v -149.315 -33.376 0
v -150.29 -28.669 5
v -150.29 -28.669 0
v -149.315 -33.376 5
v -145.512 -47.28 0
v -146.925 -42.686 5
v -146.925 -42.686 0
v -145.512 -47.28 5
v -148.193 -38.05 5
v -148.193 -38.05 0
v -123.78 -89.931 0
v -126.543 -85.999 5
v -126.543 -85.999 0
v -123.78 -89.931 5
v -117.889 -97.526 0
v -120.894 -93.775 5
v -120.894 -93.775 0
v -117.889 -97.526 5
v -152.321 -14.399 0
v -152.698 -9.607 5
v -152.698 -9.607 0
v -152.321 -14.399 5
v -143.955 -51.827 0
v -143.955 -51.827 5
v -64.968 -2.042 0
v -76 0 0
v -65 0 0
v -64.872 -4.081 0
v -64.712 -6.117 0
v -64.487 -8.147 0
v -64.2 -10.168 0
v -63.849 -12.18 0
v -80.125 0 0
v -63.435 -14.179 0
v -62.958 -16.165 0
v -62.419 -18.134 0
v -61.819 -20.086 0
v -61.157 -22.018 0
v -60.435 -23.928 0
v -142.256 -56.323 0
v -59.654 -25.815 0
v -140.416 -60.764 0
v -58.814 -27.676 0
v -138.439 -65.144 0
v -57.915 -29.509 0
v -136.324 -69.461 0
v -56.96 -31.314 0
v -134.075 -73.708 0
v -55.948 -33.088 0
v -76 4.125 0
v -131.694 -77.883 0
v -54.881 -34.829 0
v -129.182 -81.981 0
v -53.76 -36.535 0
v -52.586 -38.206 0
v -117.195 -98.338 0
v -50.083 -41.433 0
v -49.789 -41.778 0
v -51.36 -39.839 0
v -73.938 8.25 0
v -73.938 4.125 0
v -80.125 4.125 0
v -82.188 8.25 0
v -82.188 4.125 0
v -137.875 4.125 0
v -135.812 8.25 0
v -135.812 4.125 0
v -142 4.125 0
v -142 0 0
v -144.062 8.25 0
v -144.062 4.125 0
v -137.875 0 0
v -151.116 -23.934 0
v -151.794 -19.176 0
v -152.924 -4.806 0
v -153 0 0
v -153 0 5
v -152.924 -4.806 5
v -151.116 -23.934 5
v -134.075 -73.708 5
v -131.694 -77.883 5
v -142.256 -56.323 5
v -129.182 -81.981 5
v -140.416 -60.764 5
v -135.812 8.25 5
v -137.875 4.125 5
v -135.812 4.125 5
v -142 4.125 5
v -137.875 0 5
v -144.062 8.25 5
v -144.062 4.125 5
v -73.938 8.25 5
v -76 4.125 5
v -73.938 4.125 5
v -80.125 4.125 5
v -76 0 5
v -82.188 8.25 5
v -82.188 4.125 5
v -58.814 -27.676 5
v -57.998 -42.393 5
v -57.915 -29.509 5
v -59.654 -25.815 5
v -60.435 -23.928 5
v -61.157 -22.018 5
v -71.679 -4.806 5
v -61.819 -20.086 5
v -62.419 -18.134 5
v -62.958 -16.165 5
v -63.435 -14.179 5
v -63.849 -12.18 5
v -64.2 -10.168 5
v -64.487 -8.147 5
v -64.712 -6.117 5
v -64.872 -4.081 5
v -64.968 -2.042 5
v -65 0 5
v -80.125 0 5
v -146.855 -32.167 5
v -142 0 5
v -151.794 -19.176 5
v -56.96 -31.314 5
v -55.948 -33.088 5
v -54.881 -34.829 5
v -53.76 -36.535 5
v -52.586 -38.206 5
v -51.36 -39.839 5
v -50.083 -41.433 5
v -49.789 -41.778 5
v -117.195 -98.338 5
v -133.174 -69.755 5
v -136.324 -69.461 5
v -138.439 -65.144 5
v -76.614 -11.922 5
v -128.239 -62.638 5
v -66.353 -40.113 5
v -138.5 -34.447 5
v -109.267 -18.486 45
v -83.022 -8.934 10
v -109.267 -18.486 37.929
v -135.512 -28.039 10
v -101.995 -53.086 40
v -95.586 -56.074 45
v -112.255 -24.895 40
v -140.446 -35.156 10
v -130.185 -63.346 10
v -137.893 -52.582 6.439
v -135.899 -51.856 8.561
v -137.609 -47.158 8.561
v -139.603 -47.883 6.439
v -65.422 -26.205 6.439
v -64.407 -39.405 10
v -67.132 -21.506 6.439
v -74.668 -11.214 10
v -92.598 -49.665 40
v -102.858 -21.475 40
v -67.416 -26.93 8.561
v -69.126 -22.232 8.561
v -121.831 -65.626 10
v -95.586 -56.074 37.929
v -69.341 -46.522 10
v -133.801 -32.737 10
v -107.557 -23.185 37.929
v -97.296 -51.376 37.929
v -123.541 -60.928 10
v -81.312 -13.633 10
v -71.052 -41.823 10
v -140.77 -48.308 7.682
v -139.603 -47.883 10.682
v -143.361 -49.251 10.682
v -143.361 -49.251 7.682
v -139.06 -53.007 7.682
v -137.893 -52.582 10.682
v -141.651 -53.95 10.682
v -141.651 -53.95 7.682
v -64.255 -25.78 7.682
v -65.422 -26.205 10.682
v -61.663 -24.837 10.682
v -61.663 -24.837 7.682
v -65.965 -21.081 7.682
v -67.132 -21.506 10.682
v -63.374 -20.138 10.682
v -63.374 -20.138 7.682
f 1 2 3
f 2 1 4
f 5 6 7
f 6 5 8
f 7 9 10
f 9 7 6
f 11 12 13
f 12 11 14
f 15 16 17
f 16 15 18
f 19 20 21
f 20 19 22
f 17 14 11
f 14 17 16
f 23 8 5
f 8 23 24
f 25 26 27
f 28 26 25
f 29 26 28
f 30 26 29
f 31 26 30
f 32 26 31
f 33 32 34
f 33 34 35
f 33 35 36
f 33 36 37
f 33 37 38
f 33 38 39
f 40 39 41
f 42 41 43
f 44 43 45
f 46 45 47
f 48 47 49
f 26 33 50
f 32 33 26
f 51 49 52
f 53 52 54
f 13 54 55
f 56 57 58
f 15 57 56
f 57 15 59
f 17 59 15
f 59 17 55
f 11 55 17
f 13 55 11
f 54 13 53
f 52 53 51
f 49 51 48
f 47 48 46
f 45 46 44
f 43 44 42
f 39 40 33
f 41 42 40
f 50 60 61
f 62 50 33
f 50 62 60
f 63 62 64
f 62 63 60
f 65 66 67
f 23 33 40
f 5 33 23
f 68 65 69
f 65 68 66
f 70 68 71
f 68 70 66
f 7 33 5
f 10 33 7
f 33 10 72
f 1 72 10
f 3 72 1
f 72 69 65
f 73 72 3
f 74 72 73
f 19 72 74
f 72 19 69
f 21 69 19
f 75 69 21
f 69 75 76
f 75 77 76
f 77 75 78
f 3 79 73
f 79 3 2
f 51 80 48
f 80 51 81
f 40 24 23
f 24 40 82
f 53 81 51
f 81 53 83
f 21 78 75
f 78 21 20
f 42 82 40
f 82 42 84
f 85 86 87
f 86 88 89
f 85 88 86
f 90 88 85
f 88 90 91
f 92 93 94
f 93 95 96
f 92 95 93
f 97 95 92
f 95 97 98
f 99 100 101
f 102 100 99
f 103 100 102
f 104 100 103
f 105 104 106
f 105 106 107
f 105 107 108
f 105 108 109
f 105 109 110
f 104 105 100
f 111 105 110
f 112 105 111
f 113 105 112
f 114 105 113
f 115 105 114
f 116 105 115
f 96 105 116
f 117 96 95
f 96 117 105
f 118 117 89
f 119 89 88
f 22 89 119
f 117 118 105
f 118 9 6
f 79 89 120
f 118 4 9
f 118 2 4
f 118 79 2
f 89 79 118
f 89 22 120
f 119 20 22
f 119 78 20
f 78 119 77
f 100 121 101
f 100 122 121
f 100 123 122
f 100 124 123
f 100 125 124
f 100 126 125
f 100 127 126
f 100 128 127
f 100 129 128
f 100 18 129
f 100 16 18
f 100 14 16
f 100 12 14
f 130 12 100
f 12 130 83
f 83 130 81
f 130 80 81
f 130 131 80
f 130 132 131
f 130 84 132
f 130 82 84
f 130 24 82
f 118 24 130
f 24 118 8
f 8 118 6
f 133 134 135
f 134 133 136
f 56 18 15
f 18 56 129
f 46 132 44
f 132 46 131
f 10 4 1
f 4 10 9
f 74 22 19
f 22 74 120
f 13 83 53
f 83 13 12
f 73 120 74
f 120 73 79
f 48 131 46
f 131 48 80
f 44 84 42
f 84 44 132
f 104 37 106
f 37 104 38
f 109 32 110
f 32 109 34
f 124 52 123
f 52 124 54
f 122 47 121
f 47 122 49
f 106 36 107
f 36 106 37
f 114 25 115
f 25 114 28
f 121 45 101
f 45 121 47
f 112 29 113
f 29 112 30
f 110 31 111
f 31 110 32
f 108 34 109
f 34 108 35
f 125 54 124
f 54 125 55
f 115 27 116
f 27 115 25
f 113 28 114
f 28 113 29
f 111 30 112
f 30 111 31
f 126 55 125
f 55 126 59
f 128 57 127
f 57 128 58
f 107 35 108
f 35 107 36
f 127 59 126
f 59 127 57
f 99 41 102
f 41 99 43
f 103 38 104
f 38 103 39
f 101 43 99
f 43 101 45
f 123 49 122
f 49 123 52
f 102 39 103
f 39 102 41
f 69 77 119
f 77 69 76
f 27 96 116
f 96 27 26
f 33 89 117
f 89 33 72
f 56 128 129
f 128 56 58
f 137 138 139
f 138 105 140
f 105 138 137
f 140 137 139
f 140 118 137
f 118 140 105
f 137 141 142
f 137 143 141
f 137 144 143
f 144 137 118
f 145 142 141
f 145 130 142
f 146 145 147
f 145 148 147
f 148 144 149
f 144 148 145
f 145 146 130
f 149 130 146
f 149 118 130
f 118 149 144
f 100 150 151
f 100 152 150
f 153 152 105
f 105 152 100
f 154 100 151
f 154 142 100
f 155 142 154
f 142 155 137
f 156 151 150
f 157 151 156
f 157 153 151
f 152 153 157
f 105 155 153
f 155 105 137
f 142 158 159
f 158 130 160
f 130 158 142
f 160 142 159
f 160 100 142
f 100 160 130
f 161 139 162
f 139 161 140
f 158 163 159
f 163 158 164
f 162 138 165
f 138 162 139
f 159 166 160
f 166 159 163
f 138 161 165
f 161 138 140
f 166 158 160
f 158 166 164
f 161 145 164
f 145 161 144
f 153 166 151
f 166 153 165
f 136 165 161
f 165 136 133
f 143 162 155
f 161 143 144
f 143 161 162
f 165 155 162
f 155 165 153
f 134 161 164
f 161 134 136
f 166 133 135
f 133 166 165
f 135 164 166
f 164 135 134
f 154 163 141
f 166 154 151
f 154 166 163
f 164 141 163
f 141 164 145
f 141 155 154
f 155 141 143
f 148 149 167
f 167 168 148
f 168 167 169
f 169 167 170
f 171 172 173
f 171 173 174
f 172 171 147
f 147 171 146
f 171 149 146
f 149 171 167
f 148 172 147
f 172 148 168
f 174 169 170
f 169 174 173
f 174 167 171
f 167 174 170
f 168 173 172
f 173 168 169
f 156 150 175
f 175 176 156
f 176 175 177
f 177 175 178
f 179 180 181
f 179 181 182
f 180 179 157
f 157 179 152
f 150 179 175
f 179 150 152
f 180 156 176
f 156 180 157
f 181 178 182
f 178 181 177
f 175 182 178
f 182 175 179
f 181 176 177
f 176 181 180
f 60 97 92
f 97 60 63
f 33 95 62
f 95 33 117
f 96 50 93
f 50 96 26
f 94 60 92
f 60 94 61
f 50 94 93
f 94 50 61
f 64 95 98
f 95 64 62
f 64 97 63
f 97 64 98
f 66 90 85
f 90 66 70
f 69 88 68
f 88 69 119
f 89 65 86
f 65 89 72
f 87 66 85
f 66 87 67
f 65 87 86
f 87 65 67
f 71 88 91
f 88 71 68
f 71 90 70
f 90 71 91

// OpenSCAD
// file: camera_mount.scad
triangle_height = 40;
triangle_width = 40;
side_length = sqrt(2) * triangle_height;
beam_width = 5;
smaller_side_length = side_length - beam_width* (1 + sqrt(2))*sqrt(2);

module triangle(side, z){
    difference() {
        translate([0, 0, -side/sqrt(2)])
        rotate([45, 0, 0])
        cube([z, side, side]);
        
        // Cut off bottom
        translate([-500, -500, -1000])
        cube([1000, 1000, 1000]);
    };
};

module truss(){
    difference(){
        triangle(side_length, triangle_width);
        // hollow out triangle cross section
        translate([-0.5, 0, beam_width])

        triangle(smaller_side_length, triangle_width + 1);
        
        translate([beam_width, -500, , beam_width])
        cube([triangle_width - beam_width*2, 1000, triangle_height- beam_width*(2)]);
        
        //hollow base
        translate([beam_width, 0, -(beam_width*(sqrt(2)))])
        triangle(side_length, triangle_width - 2*beam_width);
    }
};

module notch(){
    translate([-500, -beam_width/4, 0])
    cube([1000, beam_width/2, beam_width/2]);
};

module hook(){
    translate([-beam_width/2,-1.5,0]) union()
    {
    cube([beam_width,3,3]);
    translate([0,0,3]) rotate([-45,0,0]) cube([beam_width,3,4]);
    }
}

//hook();
truss();
translate([0,beam_width / 2,beam_width / 2]) translate([smaller_side_length / 2, -triangle_width, 0]) rotate([45,0,0]) rotate(180) hook();
translate([0,-beam_width / 2,beam_width / 2]) translate([smaller_side_length / 2, triangle_width, 0]) rotate([-45,0,]) hook();
//difference(){
//    truss();
//    notch();
//};
// main file
ri = 65; // 65mm radius of turntable
ro = ri + 40*2.2; // outer radius
h = 5;

// r1 = outer radius, r2 = inner radius
module platform_half(r1, r2)
{
    difference()
    {
    difference()
    {
        cylinder(r=r1, h=h, $fn=200);
        translate([0,0,-0.05*h]) cylinder(r=r2, h=1.1*h, $fn=200);
    }
    translate([-ro,0,-2*h]) cube(2*ro);
}
}

// r1 = outer radius, r2 = inner radius
module platform(r1, r2) {
    difference()
    {
        platform_half(r1, r2);
        union()
        {
            rotate(40) platform_half(1.1*r1, 0.9*r2);
        }
    }
}

module mount()
{
    include <camera_mount.scad>
}

module tab(r)
{
    for (i=[0:1])
    {
        translate([0,i*15*r/16,0])
    union()
    {
    cube([r/8,r/16,h]);
    translate([r/8,-r/32,0]) rotate(90) cube([r/8,r/16,h]);
    }
}
//    difference()
//    {
//        cube([4,0.8*r, 2*h / 5]);
//        union() {
//            translate([-0.05,-0.08*r/7,-0.05*h/2]) cube([4.1,1.1*0.8*r/7,1.2*h/2]);
//            translate([-0.05,2*0.8*r/7,-0.05*h/2]) cube([4.1,0.8*r/7,1.2*h/2]);
//            translate([-0.05,4*0.8*r/7,-0.05*h/2]) cube([4.1,0.8*r/7,1.2*h/2]);
//            translate([-0.05,6*0.8*r/7,-0.05*h/2]) cube([4.1,1.1*0.8*r/7,1.2*h/2]);
//
//
//        }
//    }
}

//tab(0.8*(ro-ri));
platform(ro, ri);    
rotate(-70) translate([-20,-(ri + ro)/2,h]) mount();

rotate(90) translate([0,ri + 0.125*(ro - ri), 0]) tab(0.75*(ro - ri));
